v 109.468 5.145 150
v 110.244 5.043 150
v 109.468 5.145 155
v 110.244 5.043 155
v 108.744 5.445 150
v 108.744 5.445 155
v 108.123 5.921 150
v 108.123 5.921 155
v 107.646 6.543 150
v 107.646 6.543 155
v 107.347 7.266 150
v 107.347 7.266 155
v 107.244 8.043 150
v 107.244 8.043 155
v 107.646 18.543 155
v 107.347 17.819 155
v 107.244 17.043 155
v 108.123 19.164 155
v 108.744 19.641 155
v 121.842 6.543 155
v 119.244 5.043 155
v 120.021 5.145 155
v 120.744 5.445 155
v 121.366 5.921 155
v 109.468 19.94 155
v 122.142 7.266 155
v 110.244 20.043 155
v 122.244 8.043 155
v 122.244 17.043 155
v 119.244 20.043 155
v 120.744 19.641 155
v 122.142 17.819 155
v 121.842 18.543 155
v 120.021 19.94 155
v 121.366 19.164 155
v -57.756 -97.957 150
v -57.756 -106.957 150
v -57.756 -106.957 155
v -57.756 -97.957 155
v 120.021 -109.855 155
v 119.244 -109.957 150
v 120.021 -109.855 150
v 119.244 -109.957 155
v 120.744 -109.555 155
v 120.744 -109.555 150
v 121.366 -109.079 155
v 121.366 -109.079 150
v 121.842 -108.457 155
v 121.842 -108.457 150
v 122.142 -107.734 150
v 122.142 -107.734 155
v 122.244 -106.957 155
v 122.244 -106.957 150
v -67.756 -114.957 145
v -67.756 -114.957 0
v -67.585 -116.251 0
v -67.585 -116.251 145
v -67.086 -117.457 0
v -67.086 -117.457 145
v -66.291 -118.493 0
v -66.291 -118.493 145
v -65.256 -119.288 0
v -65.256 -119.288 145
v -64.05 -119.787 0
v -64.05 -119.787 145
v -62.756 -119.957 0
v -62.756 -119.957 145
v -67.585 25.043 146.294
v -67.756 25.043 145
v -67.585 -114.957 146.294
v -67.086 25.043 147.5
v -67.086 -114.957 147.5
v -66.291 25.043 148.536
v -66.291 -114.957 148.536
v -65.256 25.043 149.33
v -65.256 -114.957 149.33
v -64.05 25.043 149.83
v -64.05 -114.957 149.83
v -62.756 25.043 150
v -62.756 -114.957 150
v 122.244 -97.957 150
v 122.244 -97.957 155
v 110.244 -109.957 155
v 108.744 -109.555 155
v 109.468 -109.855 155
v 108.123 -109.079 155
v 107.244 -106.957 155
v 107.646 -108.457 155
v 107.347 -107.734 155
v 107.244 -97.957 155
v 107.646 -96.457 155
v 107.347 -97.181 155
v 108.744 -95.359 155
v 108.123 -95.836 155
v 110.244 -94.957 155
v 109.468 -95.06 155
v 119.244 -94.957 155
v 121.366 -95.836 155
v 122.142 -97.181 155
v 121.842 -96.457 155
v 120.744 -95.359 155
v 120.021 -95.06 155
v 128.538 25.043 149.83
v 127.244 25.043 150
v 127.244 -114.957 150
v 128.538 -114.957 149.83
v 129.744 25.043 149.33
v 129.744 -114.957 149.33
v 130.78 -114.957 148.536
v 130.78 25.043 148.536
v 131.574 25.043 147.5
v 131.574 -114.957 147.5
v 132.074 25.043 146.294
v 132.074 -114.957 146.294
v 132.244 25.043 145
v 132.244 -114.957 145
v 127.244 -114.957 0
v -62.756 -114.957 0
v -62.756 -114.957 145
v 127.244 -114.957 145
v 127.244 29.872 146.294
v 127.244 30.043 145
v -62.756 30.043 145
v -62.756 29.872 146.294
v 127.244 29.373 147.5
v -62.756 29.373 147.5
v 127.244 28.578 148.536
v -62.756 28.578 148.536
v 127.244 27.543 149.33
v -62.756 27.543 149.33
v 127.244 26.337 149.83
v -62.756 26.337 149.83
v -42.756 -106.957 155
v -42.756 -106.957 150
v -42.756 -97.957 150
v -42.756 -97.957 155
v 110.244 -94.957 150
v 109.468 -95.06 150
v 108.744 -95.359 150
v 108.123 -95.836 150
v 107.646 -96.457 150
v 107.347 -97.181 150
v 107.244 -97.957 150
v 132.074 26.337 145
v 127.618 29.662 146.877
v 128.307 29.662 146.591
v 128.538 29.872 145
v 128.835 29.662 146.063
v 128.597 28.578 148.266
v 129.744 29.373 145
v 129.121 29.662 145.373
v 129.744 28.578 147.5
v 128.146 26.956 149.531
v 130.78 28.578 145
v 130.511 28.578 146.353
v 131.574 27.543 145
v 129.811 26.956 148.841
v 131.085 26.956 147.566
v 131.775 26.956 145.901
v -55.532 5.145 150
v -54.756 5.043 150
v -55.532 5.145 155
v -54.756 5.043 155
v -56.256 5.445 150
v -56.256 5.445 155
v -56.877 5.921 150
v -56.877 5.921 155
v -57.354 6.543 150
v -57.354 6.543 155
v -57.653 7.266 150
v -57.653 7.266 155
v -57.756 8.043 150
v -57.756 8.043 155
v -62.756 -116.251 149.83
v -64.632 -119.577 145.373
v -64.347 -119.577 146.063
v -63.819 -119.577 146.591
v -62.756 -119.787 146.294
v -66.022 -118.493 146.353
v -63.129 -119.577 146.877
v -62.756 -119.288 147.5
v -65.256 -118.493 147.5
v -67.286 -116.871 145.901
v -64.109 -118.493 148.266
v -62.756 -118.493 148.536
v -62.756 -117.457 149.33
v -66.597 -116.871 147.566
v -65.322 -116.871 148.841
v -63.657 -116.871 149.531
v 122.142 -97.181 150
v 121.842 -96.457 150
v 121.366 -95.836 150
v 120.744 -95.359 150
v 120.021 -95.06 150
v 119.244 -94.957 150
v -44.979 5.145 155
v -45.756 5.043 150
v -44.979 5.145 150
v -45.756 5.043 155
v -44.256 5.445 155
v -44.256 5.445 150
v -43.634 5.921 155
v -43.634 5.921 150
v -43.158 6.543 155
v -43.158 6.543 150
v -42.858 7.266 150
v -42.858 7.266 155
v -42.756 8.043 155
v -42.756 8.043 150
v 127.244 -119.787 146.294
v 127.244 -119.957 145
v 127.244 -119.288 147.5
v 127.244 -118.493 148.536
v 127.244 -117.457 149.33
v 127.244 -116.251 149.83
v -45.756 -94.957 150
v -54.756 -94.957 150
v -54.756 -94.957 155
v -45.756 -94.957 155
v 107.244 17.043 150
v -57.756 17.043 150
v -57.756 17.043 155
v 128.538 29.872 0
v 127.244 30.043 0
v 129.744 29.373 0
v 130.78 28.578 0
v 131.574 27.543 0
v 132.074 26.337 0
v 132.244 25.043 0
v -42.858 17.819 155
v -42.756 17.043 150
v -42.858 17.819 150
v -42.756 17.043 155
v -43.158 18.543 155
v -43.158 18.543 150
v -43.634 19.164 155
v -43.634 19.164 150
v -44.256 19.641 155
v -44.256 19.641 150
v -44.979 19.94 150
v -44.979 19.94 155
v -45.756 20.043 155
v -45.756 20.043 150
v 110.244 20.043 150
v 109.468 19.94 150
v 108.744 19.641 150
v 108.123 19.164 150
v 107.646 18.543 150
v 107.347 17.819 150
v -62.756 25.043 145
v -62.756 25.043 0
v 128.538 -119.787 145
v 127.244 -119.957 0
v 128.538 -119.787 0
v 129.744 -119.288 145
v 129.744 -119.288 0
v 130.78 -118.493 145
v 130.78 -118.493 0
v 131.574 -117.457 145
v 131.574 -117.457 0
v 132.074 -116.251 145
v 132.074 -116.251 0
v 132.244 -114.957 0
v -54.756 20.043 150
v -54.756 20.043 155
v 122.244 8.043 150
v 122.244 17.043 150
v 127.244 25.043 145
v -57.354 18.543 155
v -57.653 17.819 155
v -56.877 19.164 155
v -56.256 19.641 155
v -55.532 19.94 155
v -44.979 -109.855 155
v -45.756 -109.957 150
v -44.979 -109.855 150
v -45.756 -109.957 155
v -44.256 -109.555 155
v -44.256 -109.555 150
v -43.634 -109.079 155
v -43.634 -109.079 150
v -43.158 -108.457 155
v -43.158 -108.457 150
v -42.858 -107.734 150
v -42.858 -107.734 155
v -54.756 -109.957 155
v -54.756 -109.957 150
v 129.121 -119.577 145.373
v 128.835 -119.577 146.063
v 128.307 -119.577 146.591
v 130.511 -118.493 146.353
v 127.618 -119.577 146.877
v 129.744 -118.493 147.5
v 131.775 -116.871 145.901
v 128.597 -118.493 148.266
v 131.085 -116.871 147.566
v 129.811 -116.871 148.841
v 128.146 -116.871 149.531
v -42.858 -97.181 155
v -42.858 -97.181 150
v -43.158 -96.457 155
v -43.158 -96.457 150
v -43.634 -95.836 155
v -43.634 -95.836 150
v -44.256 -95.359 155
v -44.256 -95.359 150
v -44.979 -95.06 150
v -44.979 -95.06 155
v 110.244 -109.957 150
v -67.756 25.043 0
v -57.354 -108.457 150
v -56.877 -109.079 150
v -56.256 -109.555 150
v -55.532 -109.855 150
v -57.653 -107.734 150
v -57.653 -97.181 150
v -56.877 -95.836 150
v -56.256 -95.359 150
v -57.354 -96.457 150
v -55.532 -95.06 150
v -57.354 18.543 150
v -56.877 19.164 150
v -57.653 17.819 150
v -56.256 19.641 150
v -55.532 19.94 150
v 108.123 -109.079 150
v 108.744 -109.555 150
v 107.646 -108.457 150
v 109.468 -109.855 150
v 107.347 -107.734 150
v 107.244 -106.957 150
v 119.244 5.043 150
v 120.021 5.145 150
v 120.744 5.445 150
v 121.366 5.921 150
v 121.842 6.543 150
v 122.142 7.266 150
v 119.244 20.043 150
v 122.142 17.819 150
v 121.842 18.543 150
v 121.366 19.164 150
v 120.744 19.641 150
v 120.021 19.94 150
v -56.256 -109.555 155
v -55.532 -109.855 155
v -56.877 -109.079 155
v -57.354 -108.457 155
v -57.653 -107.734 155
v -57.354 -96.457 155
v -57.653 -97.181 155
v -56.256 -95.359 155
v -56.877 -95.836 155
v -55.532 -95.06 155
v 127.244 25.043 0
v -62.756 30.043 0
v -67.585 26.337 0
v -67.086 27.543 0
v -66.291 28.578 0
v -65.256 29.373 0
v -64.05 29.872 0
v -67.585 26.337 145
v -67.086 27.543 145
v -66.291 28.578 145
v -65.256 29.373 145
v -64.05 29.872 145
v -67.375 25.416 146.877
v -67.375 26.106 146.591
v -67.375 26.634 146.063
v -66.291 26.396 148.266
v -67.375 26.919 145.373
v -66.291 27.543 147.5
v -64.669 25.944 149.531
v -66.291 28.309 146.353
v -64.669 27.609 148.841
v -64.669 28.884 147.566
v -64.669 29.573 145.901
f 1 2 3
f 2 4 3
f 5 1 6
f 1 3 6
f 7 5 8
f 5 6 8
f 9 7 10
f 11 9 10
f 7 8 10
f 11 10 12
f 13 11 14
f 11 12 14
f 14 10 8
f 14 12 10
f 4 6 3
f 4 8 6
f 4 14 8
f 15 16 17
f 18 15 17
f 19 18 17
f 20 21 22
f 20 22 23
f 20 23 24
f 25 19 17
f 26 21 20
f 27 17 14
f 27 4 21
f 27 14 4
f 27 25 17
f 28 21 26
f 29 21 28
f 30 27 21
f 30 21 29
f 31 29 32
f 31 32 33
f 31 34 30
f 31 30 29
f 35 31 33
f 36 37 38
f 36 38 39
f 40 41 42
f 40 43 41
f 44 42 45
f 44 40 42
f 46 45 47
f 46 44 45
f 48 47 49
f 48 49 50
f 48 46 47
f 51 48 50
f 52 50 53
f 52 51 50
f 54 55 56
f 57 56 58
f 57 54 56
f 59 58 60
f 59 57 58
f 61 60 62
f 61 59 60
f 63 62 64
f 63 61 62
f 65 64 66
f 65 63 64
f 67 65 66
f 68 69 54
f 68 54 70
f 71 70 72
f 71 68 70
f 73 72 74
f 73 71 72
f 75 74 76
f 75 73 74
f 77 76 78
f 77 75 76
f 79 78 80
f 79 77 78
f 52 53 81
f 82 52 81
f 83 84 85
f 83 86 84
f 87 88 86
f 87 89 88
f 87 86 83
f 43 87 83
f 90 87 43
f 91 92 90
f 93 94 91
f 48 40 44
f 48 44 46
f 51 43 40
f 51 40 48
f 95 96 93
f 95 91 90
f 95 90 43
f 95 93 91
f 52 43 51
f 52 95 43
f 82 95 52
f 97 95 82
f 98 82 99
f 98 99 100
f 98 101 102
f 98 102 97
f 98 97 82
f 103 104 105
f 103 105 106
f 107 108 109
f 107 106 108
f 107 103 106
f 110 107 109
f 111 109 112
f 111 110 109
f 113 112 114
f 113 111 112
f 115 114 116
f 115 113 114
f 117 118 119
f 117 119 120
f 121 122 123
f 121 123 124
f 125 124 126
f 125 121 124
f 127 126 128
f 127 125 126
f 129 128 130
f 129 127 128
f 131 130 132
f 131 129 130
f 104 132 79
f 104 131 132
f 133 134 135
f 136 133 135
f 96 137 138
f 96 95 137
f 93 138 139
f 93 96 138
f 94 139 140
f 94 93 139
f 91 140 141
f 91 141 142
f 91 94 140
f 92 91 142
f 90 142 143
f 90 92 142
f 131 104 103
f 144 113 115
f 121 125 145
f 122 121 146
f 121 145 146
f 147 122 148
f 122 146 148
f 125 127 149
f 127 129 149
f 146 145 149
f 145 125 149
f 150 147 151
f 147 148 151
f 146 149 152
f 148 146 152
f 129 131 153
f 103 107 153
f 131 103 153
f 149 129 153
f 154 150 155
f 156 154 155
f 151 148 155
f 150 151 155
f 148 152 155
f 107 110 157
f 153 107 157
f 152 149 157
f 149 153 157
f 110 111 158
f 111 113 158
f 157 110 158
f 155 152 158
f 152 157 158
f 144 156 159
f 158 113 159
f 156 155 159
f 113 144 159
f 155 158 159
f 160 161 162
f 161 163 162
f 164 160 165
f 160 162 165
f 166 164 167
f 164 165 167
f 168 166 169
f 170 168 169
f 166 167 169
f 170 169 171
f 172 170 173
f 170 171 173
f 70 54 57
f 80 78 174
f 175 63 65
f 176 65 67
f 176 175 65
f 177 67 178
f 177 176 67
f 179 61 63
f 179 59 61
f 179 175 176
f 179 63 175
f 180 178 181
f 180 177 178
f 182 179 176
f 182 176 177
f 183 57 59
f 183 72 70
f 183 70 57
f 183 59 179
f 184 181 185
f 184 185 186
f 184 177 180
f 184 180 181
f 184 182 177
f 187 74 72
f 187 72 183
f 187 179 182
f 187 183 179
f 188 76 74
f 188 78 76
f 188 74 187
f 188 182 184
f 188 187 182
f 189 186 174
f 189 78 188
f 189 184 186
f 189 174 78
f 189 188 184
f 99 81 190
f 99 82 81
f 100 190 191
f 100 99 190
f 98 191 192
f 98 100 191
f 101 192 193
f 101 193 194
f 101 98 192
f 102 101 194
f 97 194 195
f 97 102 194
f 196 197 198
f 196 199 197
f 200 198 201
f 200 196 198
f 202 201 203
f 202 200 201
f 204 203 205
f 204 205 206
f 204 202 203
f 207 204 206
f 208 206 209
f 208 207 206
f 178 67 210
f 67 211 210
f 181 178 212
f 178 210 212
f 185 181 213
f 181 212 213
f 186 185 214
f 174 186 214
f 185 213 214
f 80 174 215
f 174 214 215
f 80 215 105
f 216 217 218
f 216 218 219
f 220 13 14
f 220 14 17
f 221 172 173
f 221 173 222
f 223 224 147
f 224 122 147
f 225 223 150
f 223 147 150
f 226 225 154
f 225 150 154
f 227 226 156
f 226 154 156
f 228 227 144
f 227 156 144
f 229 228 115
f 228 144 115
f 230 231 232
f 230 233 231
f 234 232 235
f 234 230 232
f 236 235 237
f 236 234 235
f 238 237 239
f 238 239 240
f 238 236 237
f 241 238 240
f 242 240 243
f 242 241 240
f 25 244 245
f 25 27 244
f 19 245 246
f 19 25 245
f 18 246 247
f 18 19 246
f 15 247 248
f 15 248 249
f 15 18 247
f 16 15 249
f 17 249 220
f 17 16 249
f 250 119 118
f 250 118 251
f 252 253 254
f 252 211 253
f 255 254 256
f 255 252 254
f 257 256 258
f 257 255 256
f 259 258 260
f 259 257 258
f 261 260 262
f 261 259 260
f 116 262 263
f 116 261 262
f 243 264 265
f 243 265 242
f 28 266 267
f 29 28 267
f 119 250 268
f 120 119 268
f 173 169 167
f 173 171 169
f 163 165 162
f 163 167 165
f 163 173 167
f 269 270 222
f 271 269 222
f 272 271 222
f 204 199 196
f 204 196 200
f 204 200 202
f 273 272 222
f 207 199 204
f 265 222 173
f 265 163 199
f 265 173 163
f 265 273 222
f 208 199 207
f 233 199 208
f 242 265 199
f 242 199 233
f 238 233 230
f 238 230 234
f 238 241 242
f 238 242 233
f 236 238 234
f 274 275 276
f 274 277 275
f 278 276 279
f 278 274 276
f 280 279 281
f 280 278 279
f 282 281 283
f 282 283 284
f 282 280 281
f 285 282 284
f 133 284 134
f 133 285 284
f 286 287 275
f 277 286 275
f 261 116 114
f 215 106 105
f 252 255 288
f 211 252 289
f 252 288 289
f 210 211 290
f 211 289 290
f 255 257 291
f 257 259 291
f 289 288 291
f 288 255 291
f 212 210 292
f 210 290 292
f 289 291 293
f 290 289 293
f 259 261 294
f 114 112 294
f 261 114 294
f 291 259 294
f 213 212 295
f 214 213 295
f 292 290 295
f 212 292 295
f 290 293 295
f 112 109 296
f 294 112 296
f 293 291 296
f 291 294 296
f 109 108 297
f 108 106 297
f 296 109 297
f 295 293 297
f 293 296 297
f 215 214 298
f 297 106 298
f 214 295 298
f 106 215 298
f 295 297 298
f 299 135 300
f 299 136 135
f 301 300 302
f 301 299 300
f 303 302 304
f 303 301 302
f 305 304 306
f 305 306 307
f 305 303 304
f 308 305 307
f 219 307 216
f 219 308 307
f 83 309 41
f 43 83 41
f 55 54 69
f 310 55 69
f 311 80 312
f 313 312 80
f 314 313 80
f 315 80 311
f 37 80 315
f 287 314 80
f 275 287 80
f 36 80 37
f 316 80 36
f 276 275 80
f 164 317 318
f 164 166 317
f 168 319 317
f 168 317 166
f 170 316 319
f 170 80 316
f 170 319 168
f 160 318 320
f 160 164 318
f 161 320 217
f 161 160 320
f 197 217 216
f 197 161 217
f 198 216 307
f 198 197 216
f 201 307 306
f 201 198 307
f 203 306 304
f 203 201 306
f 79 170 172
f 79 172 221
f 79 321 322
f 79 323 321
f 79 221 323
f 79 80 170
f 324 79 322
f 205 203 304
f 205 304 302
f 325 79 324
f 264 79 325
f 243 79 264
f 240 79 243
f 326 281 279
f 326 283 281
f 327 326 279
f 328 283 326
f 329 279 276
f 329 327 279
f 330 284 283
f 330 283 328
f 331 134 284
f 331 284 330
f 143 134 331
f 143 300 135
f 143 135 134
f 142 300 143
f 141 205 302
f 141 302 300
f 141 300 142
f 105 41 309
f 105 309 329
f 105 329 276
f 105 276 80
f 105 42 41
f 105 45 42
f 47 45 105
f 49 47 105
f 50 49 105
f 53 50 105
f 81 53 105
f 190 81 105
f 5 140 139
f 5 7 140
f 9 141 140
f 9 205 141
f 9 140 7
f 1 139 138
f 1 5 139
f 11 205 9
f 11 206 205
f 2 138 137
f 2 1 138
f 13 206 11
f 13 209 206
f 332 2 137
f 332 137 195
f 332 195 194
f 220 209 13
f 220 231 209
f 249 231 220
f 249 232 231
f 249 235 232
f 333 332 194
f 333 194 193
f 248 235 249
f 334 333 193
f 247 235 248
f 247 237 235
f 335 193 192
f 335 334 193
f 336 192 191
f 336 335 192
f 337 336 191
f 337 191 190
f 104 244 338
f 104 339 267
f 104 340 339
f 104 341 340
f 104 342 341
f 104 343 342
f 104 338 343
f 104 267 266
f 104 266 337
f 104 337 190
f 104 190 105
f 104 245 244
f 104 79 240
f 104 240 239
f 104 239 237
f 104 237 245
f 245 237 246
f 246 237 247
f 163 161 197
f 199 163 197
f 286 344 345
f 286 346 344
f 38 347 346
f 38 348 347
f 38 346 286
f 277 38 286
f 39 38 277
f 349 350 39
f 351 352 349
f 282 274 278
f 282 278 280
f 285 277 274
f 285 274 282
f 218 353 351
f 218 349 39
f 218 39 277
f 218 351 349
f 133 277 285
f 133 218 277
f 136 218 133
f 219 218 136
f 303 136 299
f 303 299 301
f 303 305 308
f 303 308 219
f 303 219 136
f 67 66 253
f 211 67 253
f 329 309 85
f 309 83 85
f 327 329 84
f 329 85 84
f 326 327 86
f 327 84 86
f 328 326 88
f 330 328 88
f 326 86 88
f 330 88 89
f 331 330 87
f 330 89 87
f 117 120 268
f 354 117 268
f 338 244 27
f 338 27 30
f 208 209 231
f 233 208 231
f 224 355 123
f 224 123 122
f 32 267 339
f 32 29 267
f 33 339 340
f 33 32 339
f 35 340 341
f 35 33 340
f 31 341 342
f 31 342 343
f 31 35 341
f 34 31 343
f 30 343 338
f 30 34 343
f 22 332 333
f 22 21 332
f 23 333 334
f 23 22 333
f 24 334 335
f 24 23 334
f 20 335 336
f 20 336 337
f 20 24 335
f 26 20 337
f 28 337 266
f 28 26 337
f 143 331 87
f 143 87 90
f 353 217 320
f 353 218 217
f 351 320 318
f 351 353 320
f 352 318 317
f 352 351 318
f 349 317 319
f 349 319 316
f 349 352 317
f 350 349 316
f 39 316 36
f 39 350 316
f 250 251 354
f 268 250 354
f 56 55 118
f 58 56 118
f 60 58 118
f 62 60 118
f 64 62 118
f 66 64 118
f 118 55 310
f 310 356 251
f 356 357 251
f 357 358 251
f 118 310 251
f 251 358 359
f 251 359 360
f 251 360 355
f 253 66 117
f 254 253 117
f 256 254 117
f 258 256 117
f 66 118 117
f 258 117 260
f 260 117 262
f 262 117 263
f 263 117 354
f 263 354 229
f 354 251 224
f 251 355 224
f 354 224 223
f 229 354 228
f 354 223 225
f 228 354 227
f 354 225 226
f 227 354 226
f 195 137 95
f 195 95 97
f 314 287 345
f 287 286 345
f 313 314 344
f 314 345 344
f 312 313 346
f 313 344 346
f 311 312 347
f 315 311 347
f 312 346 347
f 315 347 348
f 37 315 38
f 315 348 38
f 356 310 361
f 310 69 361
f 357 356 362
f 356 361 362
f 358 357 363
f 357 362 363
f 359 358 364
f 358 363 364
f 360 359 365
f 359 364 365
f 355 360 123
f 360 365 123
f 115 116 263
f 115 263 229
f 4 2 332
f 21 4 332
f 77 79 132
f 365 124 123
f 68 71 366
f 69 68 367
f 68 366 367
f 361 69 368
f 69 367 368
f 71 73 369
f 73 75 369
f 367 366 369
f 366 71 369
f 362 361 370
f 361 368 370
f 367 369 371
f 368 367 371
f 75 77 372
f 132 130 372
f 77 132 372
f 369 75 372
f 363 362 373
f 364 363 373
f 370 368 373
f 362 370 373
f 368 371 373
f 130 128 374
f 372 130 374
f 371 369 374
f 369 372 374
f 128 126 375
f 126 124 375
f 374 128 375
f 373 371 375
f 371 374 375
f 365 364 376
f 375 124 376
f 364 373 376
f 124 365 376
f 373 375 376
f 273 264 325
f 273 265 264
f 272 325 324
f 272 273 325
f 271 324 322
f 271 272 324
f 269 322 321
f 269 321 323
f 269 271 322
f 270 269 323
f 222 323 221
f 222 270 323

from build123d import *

# Parameters (mm, degrees)
SKETCH1_W           = 200
SKETCH1_H           = 150
BOSS_EXTRUDE1_DEPTH = 150
SKETCH2_W           = 190
SKETCH2_H           = 140
CUT_EXTRUDE1_DEPTH  = 145
SKETCH3_W           = 15
SKETCH3_H           = 15
BOSS_EXTRUDE3_DEPTH = 5
FILLET1_R           = 5
FILLET2_R           = 3


with BuildPart() as part:
    # Sketch1 → Boss-Extrude1 (new body)
    with BuildSketch(Plane.XY):
        with Locations((32.244318182, -44.957386364)):
            Rectangle(SKETCH1_W, SKETCH1_H)
    extrude(amount=BOSS_EXTRUDE1_DEPTH)

    # Sketch2 → Cut-Extrude1 (cut)
    with BuildSketch(Plane.XY):
        with Locations((32.244318182, -44.957386364)):
            Rectangle(SKETCH2_W, SKETCH2_H)
    extrude(amount=CUT_EXTRUDE1_DEPTH, mode=Mode.SUBTRACT)

    # Sketch3 → Boss-Extrude3 (add)
    with BuildSketch(Plane.XY.offset(150)):
        with Locations((-50.255681818, 12.542613636)):
            Rectangle(SKETCH3_W, SKETCH3_H)
        with Locations((114.744318182, 12.542613636)):
            Rectangle(SKETCH3_W, SKETCH3_H)
        with Locations((-50.255681818, -102.457386364)):
            Rectangle(SKETCH3_W, SKETCH3_H)
        with Locations((114.744318182, -102.457386364)):
            Rectangle(SKETCH3_W, SKETCH3_H)
    extrude(amount=BOSS_EXTRUDE3_DEPTH)

    # Fillet1
    fillet1_edges = [part.edges().sort_by_distance(p)[0] for p in [
        (132.244318182, -44.957386364, 150),
        (32.244318182, 30.042613636, 150),
        (-67.755681818, -44.957386364, 150),
        (-67.755681818, 30.042613636, 75),
        (132.244318182, 30.042613636, 75),
        (132.244318182, -119.957386364, 75),
        (-67.755681818, -119.957386364, 75),
        (32.244318182, -119.957386364, 150),
    ]]
    fillet(fillet1_edges, radius=FILLET1_R)

    # Fillet2
    fillet2_edges = [part.edges().sort_by_distance(p)[0] for p in [
        (-42.755681818, 5.042613636, 152.5),
        (-42.755681818, 20.042613636, 152.5),
        (-57.755681818, 20.042613636, 152.5),
        (-57.755681818, 5.042613636, 152.5),
        (122.244318182, 20.042613636, 152.5),
        (107.244318182, 20.042613636, 152.5),
        (107.244318182, 5.042613636, 152.5),
        (122.244318182, 5.042613636, 152.5),
        (-57.755681818, -94.957386364, 152.5),
        (-57.755681818, -109.957386364, 152.5),
        (-42.755681818, -109.957386364, 152.5),
        (-42.755681818, -94.957386364, 152.5),
        (122.244318182, -109.957386364, 152.5),
        (122.244318182, -94.957386364, 152.5),
        (107.244318182, -94.957386364, 152.5),
        (107.244318182, -109.957386364, 152.5),
    ]]
    fillet(fillet2_edges, radius=FILLET2_R)


solid = part.part
